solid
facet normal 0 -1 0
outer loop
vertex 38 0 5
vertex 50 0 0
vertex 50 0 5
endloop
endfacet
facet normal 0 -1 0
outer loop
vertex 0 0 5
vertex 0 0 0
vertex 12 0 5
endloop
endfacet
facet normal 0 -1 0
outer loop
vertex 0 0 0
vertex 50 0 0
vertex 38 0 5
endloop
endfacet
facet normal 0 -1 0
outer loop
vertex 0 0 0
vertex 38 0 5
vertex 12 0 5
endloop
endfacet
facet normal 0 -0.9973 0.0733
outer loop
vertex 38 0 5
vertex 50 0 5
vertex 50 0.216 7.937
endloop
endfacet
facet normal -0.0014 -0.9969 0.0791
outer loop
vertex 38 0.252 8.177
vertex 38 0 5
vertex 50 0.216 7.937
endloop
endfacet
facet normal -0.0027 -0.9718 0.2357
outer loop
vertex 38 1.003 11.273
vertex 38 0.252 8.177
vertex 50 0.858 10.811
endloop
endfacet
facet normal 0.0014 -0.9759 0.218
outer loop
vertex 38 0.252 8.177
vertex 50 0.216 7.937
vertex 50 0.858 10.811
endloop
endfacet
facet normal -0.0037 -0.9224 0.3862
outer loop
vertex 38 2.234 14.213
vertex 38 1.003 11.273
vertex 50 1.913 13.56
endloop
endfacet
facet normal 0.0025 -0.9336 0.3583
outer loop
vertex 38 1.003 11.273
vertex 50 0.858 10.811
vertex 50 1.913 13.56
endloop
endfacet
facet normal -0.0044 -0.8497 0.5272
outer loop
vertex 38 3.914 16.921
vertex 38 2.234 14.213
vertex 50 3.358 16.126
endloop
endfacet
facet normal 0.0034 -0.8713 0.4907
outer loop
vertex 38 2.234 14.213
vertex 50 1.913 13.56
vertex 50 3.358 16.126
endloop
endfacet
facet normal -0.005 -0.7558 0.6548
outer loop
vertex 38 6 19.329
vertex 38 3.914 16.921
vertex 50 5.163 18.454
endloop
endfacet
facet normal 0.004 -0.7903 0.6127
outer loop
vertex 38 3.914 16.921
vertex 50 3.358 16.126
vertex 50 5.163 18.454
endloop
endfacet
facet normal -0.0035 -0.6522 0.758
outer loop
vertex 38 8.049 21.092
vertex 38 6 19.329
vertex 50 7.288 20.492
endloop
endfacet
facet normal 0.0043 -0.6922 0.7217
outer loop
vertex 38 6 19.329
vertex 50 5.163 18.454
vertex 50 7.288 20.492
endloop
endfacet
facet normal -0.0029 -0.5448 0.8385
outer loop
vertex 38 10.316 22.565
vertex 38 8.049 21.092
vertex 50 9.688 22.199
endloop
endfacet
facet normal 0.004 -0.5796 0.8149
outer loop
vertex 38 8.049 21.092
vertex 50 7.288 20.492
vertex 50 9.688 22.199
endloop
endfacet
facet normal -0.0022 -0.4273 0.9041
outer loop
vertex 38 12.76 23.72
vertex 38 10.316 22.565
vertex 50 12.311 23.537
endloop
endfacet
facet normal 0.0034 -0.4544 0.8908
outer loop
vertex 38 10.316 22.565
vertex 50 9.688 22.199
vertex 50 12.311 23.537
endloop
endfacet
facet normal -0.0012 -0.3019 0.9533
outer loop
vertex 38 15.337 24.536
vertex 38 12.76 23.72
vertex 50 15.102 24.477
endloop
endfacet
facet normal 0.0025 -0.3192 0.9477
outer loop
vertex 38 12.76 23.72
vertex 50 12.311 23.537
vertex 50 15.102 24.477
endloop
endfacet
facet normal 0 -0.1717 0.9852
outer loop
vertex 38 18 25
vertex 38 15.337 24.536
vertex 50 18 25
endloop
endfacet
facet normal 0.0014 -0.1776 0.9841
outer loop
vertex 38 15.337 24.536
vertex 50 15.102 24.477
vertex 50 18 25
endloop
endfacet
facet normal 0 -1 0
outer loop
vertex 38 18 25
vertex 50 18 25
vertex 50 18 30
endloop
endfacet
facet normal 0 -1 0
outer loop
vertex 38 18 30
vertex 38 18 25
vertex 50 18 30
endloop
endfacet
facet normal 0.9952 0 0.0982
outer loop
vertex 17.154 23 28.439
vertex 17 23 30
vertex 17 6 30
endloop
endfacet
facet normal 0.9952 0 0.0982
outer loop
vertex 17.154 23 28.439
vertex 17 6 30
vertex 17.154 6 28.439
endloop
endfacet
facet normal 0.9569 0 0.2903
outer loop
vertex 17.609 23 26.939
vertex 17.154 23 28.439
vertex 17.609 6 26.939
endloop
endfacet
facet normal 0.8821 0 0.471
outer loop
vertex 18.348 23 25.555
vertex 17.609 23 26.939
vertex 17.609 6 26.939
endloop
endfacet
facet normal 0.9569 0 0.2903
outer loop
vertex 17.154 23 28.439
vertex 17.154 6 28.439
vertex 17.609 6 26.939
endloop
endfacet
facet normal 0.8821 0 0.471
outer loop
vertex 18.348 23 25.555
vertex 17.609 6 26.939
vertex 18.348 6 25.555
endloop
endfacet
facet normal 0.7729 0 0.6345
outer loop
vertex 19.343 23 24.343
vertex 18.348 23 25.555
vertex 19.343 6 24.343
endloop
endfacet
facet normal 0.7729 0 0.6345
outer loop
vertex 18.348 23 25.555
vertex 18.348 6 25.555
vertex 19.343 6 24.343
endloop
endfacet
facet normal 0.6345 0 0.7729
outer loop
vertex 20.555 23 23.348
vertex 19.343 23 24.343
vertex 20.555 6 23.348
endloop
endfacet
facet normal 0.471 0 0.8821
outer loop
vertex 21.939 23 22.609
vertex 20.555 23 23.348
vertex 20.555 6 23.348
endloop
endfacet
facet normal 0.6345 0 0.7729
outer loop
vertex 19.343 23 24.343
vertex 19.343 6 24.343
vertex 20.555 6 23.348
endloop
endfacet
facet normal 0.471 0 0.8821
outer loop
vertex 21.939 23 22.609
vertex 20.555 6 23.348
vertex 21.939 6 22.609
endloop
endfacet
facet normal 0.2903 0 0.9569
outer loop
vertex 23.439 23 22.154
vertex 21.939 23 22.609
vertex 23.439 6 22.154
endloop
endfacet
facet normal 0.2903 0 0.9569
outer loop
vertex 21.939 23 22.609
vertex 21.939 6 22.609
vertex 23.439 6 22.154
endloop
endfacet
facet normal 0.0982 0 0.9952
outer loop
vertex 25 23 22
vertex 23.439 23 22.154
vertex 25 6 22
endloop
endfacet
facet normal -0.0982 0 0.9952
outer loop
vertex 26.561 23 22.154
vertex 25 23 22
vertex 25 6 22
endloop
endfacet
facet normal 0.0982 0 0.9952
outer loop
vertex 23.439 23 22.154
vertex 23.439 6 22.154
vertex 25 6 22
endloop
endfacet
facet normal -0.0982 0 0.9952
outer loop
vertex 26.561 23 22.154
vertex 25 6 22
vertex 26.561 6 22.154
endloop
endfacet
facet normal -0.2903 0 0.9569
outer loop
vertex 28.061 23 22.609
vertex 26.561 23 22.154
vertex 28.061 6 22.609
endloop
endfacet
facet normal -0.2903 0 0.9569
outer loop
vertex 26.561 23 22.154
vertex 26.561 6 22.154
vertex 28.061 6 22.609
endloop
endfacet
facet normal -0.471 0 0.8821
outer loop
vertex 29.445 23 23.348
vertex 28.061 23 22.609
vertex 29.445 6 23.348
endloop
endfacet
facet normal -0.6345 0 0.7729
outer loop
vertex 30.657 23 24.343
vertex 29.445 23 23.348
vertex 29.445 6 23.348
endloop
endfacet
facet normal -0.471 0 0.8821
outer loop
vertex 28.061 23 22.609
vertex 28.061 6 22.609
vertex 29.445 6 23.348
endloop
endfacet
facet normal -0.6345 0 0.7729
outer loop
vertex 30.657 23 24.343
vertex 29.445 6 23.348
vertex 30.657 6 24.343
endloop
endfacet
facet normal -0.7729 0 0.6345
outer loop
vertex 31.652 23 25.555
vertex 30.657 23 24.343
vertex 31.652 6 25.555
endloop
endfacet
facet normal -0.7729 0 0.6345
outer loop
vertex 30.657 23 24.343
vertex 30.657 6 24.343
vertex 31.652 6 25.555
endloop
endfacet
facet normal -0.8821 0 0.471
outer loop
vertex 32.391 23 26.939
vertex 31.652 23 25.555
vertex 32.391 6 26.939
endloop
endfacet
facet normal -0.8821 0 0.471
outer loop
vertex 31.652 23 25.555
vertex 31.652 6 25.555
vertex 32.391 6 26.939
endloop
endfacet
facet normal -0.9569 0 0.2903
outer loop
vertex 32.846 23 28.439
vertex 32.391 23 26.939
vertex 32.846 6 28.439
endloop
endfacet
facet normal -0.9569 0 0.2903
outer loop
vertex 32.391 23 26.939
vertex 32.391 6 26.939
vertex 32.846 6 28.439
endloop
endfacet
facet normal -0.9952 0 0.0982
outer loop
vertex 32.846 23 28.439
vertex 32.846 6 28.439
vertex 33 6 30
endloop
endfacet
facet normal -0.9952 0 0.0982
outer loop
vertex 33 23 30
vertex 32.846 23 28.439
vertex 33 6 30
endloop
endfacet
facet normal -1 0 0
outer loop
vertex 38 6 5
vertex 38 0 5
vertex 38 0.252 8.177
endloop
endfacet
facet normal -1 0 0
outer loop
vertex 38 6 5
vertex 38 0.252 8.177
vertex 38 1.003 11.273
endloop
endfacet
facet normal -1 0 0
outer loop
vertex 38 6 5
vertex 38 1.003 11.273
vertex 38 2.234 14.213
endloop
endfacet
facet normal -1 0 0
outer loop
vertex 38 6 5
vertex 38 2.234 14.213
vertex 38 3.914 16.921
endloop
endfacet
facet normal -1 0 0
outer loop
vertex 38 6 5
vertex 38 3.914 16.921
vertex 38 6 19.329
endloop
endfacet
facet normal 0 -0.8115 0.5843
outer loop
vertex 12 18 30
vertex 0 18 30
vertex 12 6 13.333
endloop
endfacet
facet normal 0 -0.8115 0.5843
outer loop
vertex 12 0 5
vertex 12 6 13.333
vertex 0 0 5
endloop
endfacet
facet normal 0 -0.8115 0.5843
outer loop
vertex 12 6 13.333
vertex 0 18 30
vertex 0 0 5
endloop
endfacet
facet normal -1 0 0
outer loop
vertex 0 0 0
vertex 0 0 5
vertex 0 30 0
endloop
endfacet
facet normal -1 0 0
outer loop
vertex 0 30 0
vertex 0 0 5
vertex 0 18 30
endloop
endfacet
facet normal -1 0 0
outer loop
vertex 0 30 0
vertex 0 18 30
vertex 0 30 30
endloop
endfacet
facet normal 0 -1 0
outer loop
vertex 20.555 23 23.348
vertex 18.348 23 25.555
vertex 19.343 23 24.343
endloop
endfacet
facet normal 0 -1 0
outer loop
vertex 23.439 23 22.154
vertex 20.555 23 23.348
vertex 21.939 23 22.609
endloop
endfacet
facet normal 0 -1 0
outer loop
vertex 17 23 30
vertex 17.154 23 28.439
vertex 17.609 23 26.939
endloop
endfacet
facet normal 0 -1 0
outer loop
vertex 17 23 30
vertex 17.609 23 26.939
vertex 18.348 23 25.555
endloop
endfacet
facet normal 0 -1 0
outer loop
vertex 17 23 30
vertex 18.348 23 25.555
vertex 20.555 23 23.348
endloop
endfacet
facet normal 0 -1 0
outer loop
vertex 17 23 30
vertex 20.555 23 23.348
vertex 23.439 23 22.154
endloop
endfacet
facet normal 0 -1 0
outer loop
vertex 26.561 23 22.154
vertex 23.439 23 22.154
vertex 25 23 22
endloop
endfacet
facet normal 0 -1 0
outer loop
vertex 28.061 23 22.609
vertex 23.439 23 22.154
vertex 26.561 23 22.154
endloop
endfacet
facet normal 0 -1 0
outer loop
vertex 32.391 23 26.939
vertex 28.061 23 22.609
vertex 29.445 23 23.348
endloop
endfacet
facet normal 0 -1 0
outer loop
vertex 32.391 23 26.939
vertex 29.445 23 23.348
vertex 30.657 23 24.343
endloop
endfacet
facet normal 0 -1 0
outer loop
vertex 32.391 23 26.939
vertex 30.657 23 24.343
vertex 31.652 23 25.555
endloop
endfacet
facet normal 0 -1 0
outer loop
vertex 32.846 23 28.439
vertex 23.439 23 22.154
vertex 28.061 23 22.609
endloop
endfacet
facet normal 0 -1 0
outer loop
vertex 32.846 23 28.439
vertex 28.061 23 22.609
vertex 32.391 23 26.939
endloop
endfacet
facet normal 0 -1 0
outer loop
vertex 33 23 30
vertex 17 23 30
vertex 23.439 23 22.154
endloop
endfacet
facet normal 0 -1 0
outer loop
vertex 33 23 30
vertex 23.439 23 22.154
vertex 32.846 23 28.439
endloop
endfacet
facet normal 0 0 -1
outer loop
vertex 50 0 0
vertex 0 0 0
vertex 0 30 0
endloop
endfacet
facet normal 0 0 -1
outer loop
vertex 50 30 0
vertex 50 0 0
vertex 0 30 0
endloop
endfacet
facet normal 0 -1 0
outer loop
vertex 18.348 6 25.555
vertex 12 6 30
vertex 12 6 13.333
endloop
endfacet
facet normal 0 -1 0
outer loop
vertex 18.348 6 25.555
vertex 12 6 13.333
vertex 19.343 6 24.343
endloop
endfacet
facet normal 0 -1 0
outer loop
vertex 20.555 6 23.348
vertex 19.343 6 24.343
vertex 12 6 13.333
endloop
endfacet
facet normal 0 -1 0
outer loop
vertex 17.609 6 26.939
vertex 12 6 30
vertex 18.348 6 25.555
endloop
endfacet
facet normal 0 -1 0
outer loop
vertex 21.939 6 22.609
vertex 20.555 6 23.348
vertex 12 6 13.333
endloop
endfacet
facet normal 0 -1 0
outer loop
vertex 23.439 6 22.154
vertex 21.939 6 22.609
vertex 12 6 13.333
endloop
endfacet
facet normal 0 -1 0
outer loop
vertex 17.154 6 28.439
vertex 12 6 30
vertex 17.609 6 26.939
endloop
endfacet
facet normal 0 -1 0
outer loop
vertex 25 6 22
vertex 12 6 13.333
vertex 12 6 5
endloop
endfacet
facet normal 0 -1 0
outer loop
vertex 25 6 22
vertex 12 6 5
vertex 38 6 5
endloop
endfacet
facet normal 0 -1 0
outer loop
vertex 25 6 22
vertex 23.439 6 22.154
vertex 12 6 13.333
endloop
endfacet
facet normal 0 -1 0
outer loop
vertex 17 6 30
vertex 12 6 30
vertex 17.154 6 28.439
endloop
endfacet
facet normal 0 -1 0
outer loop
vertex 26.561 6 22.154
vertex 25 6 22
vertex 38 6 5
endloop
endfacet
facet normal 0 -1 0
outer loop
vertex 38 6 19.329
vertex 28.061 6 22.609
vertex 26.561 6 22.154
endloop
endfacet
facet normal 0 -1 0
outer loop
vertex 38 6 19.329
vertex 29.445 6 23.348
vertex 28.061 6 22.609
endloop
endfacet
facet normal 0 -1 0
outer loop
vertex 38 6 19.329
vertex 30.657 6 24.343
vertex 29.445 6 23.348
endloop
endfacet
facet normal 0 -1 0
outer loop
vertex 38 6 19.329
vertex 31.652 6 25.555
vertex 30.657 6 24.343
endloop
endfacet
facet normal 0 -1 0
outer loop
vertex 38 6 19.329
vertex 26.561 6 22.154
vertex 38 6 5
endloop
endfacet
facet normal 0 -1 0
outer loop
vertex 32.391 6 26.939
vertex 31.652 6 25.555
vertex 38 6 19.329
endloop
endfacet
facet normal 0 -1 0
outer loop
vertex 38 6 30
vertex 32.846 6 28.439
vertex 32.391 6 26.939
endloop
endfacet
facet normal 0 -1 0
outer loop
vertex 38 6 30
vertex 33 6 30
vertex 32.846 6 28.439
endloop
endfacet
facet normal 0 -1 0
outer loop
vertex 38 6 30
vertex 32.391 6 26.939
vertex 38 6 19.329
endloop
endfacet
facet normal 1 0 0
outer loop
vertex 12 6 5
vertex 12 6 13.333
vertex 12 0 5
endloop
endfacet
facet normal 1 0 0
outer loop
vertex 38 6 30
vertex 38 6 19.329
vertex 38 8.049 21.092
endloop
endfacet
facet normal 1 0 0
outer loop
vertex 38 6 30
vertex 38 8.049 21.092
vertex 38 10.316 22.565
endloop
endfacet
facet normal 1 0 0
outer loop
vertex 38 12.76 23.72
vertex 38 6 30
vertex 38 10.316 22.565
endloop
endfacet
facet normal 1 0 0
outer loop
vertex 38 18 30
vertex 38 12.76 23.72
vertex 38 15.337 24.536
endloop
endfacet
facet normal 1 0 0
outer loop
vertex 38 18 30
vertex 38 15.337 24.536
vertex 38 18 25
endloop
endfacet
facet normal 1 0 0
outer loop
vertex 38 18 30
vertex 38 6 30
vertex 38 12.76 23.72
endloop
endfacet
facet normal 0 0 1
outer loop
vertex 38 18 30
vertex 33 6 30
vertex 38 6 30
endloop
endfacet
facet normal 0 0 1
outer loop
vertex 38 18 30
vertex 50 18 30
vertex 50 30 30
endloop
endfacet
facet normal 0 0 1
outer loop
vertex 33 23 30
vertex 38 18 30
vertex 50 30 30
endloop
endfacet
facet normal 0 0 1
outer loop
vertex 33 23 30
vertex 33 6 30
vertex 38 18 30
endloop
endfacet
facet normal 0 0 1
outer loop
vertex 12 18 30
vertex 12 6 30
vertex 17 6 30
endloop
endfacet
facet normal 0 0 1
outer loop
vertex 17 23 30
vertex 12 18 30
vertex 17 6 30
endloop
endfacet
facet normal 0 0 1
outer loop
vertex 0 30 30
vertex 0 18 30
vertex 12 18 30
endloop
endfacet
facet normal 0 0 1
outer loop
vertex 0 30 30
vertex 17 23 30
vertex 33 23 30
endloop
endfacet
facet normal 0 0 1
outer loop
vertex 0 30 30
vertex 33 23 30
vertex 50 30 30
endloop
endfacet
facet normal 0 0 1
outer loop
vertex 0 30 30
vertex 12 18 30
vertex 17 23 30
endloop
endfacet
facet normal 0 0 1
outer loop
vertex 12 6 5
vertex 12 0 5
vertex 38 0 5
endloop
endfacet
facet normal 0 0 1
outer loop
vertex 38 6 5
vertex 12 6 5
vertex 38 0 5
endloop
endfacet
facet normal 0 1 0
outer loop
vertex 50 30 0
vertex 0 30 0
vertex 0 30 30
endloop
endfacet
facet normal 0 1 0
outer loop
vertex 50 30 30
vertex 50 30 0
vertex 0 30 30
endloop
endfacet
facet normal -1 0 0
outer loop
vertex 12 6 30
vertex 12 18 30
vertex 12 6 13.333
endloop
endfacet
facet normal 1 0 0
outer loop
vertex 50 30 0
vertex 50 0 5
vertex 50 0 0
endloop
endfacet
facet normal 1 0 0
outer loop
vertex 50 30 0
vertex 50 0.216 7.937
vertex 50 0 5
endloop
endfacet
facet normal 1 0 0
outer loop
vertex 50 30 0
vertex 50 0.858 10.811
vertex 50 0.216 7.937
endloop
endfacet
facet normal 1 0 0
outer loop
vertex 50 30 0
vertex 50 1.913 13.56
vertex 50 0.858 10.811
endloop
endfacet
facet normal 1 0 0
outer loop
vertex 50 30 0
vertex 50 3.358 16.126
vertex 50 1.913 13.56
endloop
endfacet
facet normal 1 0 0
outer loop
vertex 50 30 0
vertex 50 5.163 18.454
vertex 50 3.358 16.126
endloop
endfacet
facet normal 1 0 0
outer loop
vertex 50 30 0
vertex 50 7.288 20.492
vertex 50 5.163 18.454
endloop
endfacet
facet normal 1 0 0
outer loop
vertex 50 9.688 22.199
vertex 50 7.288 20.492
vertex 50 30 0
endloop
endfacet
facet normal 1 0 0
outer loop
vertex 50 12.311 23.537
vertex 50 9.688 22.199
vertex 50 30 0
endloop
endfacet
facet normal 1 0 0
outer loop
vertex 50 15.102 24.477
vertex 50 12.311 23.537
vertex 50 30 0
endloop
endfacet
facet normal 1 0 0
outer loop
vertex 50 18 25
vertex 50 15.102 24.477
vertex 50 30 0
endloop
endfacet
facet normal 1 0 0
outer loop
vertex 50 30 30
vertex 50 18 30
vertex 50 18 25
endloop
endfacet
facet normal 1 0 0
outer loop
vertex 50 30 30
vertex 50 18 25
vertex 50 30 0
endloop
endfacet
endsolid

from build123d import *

# Parameters (mm, degrees)
F0_W     = 30
F0_H     = 30
F1_DEPTH = 50
F3_DEPTH = 12
F5_DEPTH = 12
F7_DEPTH = 6
F8_DEPTH = 23


with BuildPart() as f1:
    # F0 (on Right) → F1 (new body)
    with BuildSketch(Plane.YZ):
        with Locations((15, 15)):
            Rectangle(F0_W, F0_H)
    extrude(amount=F1_DEPTH)

    # F2 (on face) → F3 (cut)
    with BuildSketch(Plane.YZ.offset(50)):
        with BuildLine():
            Line((18, 25), (18, 30))
            Line((18, 30), (0, 30))
            Line((0, 30), (0, 5))
            ThreePointArc((0, 5), (5.16264, 18.453624), (18, 25))
        make_face()
    extrude(amount=-F3_DEPTH, mode=Mode.SUBTRACT)

    # F4 (on face) → F5 (cut)
    with BuildSketch(Plane(origin=(0, 0, 0), x_dir=(0, -1, 0), z_dir=(-1, 0, 0))):
        Polygon((0, 30), (-18, 30), (0, 5), align=None)
    extrude(amount=-F5_DEPTH, mode=Mode.SUBTRACT)

    # F6 (on face) → F7 (cut)
    with BuildSketch(Plane.XZ):
        with BuildLine():
            Line((12, 30), (12, 5))
            Line((12, 5), (38, 5))
            Line((38, 5), (38, 30))
            Line((38, 30), (33, 30))
            ThreePointArc((33, 30), (25, 22), (17, 30))
            Line((17, 30), (12, 30))
        make_face()
        with BuildLine():
            Line((33, 30), (17, 30))
            ThreePointArc((17, 30), (25, 22), (33, 30))
        make_face()
    extrude(amount=-F7_DEPTH, mode=Mode.SUBTRACT)

    # F6 (on face) → F8 (cut)
    with BuildSketch(Plane.XZ):
        with BuildLine():
            Line((33, 30), (17, 30))
            ThreePointArc((17, 30), (25, 22), (33, 30))
        make_face()
    extrude(amount=-F8_DEPTH, mode=Mode.SUBTRACT)


solid = f1.part
